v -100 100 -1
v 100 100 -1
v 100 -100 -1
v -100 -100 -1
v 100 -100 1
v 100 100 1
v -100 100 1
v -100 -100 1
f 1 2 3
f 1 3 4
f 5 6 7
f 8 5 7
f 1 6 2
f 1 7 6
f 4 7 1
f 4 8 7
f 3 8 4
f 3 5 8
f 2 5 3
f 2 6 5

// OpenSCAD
$fn=64;

module sheet_carbon_fiber(length=200, width=200, thickness=2, chamfer=0.5) {
    color([0.08,0.08,0.09])
    linear_extrude(height=thickness, center=true)
        offset(delta=-chamfer)
            offset(delta=chamfer)
                square([length, width], center=true);
}

sheet_carbon_fiber();
